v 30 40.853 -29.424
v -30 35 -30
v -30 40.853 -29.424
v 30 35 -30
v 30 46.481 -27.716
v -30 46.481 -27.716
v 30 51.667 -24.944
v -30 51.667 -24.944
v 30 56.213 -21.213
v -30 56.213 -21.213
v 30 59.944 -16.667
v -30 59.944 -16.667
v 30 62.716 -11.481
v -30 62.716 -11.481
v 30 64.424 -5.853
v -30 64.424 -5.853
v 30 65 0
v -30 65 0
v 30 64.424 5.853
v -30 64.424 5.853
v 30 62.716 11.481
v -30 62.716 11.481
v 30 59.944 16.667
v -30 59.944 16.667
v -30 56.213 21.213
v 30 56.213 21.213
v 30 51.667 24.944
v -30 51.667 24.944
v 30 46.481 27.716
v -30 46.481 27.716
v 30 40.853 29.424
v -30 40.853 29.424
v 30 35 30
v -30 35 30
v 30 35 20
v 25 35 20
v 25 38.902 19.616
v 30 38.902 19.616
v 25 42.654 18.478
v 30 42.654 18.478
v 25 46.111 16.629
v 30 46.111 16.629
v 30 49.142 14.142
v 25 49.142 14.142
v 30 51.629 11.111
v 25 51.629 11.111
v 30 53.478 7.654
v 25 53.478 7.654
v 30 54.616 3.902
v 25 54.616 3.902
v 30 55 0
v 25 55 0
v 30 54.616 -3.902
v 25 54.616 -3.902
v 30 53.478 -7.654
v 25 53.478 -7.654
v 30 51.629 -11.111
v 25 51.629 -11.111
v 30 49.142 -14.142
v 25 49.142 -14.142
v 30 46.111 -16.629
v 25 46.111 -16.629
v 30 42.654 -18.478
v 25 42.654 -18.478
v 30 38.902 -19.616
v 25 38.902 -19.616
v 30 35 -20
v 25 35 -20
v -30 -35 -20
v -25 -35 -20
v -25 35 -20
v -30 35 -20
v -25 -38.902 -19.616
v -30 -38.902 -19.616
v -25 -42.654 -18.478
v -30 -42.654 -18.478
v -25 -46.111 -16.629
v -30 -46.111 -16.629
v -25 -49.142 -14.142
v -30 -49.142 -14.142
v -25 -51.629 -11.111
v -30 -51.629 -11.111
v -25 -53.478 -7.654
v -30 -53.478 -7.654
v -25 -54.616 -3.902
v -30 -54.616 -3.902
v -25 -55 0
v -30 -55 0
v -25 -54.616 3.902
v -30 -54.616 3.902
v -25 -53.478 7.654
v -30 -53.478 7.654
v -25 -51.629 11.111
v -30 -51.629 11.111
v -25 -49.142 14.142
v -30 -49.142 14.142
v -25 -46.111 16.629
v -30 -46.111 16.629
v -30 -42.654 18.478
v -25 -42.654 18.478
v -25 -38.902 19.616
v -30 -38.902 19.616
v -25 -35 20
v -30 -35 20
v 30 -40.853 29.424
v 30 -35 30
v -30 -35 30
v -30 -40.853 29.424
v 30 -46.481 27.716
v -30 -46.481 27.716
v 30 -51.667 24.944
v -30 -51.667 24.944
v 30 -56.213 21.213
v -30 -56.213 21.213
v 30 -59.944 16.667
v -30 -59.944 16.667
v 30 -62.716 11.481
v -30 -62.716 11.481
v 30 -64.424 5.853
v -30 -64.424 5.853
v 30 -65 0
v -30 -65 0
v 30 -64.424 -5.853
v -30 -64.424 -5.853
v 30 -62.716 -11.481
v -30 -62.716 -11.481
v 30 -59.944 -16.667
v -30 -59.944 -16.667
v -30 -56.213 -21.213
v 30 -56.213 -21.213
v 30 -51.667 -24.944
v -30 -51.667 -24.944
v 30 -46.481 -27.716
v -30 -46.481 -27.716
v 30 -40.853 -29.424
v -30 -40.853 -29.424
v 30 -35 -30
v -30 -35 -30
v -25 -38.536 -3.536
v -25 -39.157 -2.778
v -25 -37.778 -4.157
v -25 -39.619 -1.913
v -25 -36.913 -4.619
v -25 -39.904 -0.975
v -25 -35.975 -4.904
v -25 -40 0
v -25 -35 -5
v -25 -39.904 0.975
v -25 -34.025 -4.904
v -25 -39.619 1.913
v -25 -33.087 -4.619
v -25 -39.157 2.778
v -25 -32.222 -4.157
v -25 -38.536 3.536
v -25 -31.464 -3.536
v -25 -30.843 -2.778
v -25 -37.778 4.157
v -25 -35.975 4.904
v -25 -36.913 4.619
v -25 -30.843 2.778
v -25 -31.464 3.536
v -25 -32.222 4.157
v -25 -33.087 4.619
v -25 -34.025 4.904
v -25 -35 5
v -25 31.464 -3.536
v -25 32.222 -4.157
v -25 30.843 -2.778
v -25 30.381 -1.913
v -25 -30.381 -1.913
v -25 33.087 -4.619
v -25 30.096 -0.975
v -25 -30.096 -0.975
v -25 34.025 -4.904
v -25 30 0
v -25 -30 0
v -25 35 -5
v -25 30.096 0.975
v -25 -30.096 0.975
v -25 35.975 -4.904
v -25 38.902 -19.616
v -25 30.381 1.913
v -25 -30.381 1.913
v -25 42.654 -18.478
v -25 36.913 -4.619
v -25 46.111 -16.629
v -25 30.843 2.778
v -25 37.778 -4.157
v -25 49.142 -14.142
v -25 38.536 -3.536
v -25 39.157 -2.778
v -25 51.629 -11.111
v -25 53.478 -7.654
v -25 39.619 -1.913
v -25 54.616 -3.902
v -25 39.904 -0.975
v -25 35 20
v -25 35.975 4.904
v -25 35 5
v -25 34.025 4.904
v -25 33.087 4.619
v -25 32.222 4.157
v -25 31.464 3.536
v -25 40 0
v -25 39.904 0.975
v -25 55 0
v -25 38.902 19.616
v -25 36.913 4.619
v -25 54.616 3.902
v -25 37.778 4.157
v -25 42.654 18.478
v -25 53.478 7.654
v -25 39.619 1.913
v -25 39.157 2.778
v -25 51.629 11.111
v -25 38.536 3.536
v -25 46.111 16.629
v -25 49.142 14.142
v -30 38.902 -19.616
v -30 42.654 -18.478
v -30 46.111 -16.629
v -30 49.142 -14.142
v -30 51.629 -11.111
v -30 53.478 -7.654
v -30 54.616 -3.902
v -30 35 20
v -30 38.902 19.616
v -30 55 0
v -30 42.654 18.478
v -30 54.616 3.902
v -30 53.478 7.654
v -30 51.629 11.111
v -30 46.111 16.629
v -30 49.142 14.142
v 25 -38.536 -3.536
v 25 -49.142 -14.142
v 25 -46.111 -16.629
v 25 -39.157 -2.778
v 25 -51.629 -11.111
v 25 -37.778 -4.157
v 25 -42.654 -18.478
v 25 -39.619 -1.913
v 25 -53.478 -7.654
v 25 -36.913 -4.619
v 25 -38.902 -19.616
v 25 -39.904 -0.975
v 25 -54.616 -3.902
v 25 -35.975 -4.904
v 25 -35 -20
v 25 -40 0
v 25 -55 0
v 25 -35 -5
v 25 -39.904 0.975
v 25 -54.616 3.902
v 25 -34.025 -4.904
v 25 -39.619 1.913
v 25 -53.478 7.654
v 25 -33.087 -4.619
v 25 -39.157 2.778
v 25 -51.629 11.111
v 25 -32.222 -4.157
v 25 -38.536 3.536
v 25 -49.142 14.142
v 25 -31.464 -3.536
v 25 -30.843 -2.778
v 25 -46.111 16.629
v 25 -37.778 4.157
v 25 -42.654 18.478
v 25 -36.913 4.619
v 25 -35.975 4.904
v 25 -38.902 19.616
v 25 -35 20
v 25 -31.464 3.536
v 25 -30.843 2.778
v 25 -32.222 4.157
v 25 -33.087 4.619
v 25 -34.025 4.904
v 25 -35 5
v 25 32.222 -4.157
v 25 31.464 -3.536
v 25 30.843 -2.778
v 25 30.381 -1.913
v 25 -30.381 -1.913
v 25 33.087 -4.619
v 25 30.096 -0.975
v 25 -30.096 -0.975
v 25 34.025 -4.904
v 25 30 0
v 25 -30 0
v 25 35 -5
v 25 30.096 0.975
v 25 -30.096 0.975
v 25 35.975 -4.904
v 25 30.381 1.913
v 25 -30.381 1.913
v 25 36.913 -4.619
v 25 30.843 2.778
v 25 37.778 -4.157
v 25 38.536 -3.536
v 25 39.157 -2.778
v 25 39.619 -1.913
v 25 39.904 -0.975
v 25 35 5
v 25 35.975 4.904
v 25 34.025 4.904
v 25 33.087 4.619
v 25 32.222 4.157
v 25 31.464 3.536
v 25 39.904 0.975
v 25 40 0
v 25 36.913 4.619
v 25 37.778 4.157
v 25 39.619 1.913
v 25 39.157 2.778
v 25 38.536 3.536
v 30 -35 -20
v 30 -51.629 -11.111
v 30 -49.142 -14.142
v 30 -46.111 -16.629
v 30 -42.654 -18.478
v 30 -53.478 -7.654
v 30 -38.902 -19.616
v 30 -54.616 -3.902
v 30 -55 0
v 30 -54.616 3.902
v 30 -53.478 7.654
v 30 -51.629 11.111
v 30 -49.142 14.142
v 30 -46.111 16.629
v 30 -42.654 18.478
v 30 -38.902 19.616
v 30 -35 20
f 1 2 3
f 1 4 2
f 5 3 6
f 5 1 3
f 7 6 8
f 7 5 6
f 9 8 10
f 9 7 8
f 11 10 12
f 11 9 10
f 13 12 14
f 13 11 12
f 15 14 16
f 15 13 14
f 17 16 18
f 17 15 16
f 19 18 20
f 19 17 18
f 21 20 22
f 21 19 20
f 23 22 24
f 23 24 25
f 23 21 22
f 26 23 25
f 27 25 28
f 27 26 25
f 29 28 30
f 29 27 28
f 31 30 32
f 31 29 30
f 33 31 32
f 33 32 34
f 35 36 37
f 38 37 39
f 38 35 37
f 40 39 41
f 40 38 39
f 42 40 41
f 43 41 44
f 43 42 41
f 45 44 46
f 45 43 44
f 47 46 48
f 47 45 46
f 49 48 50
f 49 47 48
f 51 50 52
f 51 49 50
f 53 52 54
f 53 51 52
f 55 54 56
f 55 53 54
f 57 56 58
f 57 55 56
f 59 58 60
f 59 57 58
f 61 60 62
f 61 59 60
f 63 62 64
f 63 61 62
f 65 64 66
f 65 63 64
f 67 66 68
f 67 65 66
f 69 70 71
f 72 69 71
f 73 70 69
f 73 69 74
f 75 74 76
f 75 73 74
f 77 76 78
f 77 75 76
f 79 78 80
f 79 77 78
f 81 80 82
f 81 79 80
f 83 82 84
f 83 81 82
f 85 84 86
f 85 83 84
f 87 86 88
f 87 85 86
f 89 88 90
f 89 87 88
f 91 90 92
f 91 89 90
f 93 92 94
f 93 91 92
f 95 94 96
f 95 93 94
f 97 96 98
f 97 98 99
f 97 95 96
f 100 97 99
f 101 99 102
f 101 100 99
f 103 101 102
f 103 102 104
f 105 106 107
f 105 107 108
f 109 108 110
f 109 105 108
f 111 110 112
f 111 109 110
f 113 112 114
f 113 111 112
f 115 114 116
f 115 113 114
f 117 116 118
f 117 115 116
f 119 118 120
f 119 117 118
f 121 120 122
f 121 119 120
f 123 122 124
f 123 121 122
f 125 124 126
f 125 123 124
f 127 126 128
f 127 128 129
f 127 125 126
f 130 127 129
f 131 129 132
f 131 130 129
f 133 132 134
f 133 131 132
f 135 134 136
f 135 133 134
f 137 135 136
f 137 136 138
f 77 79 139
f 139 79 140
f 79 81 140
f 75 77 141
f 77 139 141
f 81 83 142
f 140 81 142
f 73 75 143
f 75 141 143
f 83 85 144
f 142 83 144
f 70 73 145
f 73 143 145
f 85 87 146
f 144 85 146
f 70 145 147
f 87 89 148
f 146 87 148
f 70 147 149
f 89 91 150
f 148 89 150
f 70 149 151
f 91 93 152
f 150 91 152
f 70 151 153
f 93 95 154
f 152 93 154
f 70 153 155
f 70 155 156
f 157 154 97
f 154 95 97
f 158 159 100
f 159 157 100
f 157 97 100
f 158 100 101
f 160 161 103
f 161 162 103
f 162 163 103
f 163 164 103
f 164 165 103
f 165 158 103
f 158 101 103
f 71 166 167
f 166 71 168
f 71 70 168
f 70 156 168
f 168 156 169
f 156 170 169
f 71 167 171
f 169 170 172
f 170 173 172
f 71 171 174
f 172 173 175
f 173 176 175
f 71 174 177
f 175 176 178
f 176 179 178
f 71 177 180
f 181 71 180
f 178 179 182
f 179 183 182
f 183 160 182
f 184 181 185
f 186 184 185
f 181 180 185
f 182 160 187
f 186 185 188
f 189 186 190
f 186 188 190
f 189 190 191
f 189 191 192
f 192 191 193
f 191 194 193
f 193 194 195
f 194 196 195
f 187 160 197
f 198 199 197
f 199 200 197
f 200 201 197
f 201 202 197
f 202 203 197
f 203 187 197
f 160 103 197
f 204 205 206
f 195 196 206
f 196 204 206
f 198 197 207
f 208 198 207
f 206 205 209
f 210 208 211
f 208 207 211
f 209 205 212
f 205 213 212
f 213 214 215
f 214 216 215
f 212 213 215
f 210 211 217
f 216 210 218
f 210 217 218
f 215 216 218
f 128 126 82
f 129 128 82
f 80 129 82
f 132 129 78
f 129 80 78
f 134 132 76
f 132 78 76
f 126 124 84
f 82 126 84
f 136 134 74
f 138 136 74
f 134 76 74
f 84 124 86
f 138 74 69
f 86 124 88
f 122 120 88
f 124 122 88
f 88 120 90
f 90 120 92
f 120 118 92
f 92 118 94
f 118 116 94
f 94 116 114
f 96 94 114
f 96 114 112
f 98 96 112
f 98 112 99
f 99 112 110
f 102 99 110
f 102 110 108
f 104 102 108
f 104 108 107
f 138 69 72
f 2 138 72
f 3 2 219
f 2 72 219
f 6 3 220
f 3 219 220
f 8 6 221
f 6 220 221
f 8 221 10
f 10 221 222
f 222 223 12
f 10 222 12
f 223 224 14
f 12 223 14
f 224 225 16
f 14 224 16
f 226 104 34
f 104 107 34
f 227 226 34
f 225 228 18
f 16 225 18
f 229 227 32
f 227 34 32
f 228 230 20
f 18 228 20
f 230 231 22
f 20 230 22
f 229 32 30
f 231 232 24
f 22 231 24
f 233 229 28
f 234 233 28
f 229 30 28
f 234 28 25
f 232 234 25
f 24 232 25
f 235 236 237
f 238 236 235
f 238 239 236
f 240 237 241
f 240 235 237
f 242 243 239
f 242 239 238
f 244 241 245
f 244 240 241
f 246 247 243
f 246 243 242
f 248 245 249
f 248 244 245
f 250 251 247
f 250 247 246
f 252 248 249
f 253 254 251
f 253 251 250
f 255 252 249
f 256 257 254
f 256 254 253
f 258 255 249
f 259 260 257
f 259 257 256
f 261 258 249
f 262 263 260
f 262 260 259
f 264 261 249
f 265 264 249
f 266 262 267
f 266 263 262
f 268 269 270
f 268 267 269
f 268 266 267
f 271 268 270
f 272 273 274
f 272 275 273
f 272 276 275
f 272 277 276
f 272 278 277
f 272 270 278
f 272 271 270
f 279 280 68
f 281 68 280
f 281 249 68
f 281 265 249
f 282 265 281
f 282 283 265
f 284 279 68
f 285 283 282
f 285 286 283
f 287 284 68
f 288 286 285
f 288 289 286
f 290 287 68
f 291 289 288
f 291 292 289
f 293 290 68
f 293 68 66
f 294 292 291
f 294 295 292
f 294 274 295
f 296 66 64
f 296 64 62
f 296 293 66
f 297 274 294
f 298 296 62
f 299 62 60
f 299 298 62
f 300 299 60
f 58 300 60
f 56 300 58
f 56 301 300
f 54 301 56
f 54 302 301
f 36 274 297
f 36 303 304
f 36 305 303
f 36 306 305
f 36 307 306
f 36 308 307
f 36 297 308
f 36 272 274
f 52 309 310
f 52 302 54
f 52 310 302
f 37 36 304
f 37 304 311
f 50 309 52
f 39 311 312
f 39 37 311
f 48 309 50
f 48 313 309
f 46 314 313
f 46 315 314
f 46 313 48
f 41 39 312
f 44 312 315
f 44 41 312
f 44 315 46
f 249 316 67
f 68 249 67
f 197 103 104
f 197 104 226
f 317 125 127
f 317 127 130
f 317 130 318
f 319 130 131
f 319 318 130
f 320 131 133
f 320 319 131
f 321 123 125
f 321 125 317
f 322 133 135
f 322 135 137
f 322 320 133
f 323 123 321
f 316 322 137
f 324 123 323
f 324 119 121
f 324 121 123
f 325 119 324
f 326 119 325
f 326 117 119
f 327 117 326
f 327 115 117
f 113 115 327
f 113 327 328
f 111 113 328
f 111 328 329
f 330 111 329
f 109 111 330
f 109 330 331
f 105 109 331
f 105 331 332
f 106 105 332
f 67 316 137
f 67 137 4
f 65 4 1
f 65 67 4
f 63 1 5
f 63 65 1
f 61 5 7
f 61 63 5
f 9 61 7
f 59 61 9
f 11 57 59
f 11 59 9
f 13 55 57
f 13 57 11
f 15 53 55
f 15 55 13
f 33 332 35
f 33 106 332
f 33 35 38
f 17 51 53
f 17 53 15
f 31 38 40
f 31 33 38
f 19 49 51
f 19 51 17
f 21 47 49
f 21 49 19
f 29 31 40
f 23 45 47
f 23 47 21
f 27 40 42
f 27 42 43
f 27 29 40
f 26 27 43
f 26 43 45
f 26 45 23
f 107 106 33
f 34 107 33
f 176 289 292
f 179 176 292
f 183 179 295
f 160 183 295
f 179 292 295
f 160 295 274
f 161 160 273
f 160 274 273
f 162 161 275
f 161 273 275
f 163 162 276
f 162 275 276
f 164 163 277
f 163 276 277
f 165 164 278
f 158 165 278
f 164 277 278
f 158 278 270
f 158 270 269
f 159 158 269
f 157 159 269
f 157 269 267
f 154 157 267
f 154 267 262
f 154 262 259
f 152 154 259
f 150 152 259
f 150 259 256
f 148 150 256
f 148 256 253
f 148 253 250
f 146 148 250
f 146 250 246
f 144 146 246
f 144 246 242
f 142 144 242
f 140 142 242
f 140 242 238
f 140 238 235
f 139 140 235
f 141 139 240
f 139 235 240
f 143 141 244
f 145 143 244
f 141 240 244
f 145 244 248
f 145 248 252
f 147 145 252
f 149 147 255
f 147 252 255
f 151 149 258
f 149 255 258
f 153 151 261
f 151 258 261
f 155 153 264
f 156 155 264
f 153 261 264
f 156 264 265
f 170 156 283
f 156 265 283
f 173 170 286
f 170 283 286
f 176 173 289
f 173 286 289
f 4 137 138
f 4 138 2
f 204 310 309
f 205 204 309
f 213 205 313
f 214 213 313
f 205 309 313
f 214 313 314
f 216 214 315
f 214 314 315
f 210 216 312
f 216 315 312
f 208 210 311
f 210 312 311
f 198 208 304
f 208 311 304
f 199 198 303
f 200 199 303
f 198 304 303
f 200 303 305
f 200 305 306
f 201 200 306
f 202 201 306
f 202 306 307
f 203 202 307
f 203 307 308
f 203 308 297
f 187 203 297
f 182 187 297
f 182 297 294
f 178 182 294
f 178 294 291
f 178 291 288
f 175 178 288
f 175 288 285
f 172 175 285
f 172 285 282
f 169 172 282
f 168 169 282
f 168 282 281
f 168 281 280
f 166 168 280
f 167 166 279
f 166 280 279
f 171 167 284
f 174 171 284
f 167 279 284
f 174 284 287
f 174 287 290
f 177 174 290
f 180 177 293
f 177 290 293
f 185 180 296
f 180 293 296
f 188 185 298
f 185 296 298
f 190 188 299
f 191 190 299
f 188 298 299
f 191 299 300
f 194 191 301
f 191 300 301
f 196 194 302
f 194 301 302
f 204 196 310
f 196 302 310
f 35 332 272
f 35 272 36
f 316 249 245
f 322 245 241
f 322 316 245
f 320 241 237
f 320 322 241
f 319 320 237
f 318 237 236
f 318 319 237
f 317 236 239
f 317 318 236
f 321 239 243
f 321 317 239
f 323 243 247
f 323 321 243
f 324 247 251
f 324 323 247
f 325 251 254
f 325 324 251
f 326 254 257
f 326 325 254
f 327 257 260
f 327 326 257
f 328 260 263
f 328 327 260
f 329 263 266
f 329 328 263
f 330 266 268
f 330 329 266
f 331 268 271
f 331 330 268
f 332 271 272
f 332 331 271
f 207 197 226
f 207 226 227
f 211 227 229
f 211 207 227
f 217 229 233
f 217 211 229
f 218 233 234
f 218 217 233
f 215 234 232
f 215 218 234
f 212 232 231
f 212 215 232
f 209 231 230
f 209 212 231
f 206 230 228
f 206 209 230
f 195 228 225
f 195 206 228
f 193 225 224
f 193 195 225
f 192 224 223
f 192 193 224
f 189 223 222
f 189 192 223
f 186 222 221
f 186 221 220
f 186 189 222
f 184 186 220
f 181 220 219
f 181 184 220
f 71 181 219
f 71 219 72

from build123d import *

# Parameters (mm, degrees)
F0_W     = 70
F0_H     = 10
F1_DEPTH = 30
F0_H_2   = 40
F2_DEPTH = 25
F3_R     = 5
F4_DEPTH = 55.001


with BuildPart() as f1:
    # F0 (on Right) → F1 (new body, symmetric)
    with BuildSketch(Plane.YZ):
        with Locations((0, 25)):
            Rectangle(F0_W, F0_H)
        with BuildLine():
            Line((-35, 20), (-35, 30))
            ThreePointArc((-35, 30), (-65, 0), (-35, -30))
            Line((-35, -30), (-35, -20))
            ThreePointArc((-35, -20), (-55, 0), (-35, 20))
        make_face()
        with BuildLine():
            ThreePointArc((35, -30), (65, 0), (35, 30))
            Line((35, 30), (35, 20))
            ThreePointArc((35, 20), (55, 0), (35, -20))
            Line((35, -20), (35, -30))
        make_face()
        with Locations((0, -25)):
            Rectangle(F0_W, F0_H)
    extrude(amount=F1_DEPTH, both=True)

    # F0 (on Right) → F2 (join, symmetric)
    with BuildSketch(Plane.YZ):
        with BuildLine():
            Line((-35, -20), (-35, 20))
            ThreePointArc((-35, 20), (-55, 0), (-35, -20))
        make_face()
        Rectangle(F0_W, F0_H_2)
        with BuildLine():
            ThreePointArc((35, -20), (55, 0), (35, 20))
            Line((35, 20), (35, -20))
        make_face()
    extrude(amount=F2_DEPTH, both=True)

    # F3 (on face) → F4 (cut, through all)
    with BuildSketch(Plane.YZ.offset(25)):
        with Locations((-35, 0)):
            Circle(F3_R)
        with Locations((35, 0)):
            Circle(F3_R)
    extrude(amount=-F4_DEPTH, mode=Mode.SUBTRACT)


solid = f1.part
